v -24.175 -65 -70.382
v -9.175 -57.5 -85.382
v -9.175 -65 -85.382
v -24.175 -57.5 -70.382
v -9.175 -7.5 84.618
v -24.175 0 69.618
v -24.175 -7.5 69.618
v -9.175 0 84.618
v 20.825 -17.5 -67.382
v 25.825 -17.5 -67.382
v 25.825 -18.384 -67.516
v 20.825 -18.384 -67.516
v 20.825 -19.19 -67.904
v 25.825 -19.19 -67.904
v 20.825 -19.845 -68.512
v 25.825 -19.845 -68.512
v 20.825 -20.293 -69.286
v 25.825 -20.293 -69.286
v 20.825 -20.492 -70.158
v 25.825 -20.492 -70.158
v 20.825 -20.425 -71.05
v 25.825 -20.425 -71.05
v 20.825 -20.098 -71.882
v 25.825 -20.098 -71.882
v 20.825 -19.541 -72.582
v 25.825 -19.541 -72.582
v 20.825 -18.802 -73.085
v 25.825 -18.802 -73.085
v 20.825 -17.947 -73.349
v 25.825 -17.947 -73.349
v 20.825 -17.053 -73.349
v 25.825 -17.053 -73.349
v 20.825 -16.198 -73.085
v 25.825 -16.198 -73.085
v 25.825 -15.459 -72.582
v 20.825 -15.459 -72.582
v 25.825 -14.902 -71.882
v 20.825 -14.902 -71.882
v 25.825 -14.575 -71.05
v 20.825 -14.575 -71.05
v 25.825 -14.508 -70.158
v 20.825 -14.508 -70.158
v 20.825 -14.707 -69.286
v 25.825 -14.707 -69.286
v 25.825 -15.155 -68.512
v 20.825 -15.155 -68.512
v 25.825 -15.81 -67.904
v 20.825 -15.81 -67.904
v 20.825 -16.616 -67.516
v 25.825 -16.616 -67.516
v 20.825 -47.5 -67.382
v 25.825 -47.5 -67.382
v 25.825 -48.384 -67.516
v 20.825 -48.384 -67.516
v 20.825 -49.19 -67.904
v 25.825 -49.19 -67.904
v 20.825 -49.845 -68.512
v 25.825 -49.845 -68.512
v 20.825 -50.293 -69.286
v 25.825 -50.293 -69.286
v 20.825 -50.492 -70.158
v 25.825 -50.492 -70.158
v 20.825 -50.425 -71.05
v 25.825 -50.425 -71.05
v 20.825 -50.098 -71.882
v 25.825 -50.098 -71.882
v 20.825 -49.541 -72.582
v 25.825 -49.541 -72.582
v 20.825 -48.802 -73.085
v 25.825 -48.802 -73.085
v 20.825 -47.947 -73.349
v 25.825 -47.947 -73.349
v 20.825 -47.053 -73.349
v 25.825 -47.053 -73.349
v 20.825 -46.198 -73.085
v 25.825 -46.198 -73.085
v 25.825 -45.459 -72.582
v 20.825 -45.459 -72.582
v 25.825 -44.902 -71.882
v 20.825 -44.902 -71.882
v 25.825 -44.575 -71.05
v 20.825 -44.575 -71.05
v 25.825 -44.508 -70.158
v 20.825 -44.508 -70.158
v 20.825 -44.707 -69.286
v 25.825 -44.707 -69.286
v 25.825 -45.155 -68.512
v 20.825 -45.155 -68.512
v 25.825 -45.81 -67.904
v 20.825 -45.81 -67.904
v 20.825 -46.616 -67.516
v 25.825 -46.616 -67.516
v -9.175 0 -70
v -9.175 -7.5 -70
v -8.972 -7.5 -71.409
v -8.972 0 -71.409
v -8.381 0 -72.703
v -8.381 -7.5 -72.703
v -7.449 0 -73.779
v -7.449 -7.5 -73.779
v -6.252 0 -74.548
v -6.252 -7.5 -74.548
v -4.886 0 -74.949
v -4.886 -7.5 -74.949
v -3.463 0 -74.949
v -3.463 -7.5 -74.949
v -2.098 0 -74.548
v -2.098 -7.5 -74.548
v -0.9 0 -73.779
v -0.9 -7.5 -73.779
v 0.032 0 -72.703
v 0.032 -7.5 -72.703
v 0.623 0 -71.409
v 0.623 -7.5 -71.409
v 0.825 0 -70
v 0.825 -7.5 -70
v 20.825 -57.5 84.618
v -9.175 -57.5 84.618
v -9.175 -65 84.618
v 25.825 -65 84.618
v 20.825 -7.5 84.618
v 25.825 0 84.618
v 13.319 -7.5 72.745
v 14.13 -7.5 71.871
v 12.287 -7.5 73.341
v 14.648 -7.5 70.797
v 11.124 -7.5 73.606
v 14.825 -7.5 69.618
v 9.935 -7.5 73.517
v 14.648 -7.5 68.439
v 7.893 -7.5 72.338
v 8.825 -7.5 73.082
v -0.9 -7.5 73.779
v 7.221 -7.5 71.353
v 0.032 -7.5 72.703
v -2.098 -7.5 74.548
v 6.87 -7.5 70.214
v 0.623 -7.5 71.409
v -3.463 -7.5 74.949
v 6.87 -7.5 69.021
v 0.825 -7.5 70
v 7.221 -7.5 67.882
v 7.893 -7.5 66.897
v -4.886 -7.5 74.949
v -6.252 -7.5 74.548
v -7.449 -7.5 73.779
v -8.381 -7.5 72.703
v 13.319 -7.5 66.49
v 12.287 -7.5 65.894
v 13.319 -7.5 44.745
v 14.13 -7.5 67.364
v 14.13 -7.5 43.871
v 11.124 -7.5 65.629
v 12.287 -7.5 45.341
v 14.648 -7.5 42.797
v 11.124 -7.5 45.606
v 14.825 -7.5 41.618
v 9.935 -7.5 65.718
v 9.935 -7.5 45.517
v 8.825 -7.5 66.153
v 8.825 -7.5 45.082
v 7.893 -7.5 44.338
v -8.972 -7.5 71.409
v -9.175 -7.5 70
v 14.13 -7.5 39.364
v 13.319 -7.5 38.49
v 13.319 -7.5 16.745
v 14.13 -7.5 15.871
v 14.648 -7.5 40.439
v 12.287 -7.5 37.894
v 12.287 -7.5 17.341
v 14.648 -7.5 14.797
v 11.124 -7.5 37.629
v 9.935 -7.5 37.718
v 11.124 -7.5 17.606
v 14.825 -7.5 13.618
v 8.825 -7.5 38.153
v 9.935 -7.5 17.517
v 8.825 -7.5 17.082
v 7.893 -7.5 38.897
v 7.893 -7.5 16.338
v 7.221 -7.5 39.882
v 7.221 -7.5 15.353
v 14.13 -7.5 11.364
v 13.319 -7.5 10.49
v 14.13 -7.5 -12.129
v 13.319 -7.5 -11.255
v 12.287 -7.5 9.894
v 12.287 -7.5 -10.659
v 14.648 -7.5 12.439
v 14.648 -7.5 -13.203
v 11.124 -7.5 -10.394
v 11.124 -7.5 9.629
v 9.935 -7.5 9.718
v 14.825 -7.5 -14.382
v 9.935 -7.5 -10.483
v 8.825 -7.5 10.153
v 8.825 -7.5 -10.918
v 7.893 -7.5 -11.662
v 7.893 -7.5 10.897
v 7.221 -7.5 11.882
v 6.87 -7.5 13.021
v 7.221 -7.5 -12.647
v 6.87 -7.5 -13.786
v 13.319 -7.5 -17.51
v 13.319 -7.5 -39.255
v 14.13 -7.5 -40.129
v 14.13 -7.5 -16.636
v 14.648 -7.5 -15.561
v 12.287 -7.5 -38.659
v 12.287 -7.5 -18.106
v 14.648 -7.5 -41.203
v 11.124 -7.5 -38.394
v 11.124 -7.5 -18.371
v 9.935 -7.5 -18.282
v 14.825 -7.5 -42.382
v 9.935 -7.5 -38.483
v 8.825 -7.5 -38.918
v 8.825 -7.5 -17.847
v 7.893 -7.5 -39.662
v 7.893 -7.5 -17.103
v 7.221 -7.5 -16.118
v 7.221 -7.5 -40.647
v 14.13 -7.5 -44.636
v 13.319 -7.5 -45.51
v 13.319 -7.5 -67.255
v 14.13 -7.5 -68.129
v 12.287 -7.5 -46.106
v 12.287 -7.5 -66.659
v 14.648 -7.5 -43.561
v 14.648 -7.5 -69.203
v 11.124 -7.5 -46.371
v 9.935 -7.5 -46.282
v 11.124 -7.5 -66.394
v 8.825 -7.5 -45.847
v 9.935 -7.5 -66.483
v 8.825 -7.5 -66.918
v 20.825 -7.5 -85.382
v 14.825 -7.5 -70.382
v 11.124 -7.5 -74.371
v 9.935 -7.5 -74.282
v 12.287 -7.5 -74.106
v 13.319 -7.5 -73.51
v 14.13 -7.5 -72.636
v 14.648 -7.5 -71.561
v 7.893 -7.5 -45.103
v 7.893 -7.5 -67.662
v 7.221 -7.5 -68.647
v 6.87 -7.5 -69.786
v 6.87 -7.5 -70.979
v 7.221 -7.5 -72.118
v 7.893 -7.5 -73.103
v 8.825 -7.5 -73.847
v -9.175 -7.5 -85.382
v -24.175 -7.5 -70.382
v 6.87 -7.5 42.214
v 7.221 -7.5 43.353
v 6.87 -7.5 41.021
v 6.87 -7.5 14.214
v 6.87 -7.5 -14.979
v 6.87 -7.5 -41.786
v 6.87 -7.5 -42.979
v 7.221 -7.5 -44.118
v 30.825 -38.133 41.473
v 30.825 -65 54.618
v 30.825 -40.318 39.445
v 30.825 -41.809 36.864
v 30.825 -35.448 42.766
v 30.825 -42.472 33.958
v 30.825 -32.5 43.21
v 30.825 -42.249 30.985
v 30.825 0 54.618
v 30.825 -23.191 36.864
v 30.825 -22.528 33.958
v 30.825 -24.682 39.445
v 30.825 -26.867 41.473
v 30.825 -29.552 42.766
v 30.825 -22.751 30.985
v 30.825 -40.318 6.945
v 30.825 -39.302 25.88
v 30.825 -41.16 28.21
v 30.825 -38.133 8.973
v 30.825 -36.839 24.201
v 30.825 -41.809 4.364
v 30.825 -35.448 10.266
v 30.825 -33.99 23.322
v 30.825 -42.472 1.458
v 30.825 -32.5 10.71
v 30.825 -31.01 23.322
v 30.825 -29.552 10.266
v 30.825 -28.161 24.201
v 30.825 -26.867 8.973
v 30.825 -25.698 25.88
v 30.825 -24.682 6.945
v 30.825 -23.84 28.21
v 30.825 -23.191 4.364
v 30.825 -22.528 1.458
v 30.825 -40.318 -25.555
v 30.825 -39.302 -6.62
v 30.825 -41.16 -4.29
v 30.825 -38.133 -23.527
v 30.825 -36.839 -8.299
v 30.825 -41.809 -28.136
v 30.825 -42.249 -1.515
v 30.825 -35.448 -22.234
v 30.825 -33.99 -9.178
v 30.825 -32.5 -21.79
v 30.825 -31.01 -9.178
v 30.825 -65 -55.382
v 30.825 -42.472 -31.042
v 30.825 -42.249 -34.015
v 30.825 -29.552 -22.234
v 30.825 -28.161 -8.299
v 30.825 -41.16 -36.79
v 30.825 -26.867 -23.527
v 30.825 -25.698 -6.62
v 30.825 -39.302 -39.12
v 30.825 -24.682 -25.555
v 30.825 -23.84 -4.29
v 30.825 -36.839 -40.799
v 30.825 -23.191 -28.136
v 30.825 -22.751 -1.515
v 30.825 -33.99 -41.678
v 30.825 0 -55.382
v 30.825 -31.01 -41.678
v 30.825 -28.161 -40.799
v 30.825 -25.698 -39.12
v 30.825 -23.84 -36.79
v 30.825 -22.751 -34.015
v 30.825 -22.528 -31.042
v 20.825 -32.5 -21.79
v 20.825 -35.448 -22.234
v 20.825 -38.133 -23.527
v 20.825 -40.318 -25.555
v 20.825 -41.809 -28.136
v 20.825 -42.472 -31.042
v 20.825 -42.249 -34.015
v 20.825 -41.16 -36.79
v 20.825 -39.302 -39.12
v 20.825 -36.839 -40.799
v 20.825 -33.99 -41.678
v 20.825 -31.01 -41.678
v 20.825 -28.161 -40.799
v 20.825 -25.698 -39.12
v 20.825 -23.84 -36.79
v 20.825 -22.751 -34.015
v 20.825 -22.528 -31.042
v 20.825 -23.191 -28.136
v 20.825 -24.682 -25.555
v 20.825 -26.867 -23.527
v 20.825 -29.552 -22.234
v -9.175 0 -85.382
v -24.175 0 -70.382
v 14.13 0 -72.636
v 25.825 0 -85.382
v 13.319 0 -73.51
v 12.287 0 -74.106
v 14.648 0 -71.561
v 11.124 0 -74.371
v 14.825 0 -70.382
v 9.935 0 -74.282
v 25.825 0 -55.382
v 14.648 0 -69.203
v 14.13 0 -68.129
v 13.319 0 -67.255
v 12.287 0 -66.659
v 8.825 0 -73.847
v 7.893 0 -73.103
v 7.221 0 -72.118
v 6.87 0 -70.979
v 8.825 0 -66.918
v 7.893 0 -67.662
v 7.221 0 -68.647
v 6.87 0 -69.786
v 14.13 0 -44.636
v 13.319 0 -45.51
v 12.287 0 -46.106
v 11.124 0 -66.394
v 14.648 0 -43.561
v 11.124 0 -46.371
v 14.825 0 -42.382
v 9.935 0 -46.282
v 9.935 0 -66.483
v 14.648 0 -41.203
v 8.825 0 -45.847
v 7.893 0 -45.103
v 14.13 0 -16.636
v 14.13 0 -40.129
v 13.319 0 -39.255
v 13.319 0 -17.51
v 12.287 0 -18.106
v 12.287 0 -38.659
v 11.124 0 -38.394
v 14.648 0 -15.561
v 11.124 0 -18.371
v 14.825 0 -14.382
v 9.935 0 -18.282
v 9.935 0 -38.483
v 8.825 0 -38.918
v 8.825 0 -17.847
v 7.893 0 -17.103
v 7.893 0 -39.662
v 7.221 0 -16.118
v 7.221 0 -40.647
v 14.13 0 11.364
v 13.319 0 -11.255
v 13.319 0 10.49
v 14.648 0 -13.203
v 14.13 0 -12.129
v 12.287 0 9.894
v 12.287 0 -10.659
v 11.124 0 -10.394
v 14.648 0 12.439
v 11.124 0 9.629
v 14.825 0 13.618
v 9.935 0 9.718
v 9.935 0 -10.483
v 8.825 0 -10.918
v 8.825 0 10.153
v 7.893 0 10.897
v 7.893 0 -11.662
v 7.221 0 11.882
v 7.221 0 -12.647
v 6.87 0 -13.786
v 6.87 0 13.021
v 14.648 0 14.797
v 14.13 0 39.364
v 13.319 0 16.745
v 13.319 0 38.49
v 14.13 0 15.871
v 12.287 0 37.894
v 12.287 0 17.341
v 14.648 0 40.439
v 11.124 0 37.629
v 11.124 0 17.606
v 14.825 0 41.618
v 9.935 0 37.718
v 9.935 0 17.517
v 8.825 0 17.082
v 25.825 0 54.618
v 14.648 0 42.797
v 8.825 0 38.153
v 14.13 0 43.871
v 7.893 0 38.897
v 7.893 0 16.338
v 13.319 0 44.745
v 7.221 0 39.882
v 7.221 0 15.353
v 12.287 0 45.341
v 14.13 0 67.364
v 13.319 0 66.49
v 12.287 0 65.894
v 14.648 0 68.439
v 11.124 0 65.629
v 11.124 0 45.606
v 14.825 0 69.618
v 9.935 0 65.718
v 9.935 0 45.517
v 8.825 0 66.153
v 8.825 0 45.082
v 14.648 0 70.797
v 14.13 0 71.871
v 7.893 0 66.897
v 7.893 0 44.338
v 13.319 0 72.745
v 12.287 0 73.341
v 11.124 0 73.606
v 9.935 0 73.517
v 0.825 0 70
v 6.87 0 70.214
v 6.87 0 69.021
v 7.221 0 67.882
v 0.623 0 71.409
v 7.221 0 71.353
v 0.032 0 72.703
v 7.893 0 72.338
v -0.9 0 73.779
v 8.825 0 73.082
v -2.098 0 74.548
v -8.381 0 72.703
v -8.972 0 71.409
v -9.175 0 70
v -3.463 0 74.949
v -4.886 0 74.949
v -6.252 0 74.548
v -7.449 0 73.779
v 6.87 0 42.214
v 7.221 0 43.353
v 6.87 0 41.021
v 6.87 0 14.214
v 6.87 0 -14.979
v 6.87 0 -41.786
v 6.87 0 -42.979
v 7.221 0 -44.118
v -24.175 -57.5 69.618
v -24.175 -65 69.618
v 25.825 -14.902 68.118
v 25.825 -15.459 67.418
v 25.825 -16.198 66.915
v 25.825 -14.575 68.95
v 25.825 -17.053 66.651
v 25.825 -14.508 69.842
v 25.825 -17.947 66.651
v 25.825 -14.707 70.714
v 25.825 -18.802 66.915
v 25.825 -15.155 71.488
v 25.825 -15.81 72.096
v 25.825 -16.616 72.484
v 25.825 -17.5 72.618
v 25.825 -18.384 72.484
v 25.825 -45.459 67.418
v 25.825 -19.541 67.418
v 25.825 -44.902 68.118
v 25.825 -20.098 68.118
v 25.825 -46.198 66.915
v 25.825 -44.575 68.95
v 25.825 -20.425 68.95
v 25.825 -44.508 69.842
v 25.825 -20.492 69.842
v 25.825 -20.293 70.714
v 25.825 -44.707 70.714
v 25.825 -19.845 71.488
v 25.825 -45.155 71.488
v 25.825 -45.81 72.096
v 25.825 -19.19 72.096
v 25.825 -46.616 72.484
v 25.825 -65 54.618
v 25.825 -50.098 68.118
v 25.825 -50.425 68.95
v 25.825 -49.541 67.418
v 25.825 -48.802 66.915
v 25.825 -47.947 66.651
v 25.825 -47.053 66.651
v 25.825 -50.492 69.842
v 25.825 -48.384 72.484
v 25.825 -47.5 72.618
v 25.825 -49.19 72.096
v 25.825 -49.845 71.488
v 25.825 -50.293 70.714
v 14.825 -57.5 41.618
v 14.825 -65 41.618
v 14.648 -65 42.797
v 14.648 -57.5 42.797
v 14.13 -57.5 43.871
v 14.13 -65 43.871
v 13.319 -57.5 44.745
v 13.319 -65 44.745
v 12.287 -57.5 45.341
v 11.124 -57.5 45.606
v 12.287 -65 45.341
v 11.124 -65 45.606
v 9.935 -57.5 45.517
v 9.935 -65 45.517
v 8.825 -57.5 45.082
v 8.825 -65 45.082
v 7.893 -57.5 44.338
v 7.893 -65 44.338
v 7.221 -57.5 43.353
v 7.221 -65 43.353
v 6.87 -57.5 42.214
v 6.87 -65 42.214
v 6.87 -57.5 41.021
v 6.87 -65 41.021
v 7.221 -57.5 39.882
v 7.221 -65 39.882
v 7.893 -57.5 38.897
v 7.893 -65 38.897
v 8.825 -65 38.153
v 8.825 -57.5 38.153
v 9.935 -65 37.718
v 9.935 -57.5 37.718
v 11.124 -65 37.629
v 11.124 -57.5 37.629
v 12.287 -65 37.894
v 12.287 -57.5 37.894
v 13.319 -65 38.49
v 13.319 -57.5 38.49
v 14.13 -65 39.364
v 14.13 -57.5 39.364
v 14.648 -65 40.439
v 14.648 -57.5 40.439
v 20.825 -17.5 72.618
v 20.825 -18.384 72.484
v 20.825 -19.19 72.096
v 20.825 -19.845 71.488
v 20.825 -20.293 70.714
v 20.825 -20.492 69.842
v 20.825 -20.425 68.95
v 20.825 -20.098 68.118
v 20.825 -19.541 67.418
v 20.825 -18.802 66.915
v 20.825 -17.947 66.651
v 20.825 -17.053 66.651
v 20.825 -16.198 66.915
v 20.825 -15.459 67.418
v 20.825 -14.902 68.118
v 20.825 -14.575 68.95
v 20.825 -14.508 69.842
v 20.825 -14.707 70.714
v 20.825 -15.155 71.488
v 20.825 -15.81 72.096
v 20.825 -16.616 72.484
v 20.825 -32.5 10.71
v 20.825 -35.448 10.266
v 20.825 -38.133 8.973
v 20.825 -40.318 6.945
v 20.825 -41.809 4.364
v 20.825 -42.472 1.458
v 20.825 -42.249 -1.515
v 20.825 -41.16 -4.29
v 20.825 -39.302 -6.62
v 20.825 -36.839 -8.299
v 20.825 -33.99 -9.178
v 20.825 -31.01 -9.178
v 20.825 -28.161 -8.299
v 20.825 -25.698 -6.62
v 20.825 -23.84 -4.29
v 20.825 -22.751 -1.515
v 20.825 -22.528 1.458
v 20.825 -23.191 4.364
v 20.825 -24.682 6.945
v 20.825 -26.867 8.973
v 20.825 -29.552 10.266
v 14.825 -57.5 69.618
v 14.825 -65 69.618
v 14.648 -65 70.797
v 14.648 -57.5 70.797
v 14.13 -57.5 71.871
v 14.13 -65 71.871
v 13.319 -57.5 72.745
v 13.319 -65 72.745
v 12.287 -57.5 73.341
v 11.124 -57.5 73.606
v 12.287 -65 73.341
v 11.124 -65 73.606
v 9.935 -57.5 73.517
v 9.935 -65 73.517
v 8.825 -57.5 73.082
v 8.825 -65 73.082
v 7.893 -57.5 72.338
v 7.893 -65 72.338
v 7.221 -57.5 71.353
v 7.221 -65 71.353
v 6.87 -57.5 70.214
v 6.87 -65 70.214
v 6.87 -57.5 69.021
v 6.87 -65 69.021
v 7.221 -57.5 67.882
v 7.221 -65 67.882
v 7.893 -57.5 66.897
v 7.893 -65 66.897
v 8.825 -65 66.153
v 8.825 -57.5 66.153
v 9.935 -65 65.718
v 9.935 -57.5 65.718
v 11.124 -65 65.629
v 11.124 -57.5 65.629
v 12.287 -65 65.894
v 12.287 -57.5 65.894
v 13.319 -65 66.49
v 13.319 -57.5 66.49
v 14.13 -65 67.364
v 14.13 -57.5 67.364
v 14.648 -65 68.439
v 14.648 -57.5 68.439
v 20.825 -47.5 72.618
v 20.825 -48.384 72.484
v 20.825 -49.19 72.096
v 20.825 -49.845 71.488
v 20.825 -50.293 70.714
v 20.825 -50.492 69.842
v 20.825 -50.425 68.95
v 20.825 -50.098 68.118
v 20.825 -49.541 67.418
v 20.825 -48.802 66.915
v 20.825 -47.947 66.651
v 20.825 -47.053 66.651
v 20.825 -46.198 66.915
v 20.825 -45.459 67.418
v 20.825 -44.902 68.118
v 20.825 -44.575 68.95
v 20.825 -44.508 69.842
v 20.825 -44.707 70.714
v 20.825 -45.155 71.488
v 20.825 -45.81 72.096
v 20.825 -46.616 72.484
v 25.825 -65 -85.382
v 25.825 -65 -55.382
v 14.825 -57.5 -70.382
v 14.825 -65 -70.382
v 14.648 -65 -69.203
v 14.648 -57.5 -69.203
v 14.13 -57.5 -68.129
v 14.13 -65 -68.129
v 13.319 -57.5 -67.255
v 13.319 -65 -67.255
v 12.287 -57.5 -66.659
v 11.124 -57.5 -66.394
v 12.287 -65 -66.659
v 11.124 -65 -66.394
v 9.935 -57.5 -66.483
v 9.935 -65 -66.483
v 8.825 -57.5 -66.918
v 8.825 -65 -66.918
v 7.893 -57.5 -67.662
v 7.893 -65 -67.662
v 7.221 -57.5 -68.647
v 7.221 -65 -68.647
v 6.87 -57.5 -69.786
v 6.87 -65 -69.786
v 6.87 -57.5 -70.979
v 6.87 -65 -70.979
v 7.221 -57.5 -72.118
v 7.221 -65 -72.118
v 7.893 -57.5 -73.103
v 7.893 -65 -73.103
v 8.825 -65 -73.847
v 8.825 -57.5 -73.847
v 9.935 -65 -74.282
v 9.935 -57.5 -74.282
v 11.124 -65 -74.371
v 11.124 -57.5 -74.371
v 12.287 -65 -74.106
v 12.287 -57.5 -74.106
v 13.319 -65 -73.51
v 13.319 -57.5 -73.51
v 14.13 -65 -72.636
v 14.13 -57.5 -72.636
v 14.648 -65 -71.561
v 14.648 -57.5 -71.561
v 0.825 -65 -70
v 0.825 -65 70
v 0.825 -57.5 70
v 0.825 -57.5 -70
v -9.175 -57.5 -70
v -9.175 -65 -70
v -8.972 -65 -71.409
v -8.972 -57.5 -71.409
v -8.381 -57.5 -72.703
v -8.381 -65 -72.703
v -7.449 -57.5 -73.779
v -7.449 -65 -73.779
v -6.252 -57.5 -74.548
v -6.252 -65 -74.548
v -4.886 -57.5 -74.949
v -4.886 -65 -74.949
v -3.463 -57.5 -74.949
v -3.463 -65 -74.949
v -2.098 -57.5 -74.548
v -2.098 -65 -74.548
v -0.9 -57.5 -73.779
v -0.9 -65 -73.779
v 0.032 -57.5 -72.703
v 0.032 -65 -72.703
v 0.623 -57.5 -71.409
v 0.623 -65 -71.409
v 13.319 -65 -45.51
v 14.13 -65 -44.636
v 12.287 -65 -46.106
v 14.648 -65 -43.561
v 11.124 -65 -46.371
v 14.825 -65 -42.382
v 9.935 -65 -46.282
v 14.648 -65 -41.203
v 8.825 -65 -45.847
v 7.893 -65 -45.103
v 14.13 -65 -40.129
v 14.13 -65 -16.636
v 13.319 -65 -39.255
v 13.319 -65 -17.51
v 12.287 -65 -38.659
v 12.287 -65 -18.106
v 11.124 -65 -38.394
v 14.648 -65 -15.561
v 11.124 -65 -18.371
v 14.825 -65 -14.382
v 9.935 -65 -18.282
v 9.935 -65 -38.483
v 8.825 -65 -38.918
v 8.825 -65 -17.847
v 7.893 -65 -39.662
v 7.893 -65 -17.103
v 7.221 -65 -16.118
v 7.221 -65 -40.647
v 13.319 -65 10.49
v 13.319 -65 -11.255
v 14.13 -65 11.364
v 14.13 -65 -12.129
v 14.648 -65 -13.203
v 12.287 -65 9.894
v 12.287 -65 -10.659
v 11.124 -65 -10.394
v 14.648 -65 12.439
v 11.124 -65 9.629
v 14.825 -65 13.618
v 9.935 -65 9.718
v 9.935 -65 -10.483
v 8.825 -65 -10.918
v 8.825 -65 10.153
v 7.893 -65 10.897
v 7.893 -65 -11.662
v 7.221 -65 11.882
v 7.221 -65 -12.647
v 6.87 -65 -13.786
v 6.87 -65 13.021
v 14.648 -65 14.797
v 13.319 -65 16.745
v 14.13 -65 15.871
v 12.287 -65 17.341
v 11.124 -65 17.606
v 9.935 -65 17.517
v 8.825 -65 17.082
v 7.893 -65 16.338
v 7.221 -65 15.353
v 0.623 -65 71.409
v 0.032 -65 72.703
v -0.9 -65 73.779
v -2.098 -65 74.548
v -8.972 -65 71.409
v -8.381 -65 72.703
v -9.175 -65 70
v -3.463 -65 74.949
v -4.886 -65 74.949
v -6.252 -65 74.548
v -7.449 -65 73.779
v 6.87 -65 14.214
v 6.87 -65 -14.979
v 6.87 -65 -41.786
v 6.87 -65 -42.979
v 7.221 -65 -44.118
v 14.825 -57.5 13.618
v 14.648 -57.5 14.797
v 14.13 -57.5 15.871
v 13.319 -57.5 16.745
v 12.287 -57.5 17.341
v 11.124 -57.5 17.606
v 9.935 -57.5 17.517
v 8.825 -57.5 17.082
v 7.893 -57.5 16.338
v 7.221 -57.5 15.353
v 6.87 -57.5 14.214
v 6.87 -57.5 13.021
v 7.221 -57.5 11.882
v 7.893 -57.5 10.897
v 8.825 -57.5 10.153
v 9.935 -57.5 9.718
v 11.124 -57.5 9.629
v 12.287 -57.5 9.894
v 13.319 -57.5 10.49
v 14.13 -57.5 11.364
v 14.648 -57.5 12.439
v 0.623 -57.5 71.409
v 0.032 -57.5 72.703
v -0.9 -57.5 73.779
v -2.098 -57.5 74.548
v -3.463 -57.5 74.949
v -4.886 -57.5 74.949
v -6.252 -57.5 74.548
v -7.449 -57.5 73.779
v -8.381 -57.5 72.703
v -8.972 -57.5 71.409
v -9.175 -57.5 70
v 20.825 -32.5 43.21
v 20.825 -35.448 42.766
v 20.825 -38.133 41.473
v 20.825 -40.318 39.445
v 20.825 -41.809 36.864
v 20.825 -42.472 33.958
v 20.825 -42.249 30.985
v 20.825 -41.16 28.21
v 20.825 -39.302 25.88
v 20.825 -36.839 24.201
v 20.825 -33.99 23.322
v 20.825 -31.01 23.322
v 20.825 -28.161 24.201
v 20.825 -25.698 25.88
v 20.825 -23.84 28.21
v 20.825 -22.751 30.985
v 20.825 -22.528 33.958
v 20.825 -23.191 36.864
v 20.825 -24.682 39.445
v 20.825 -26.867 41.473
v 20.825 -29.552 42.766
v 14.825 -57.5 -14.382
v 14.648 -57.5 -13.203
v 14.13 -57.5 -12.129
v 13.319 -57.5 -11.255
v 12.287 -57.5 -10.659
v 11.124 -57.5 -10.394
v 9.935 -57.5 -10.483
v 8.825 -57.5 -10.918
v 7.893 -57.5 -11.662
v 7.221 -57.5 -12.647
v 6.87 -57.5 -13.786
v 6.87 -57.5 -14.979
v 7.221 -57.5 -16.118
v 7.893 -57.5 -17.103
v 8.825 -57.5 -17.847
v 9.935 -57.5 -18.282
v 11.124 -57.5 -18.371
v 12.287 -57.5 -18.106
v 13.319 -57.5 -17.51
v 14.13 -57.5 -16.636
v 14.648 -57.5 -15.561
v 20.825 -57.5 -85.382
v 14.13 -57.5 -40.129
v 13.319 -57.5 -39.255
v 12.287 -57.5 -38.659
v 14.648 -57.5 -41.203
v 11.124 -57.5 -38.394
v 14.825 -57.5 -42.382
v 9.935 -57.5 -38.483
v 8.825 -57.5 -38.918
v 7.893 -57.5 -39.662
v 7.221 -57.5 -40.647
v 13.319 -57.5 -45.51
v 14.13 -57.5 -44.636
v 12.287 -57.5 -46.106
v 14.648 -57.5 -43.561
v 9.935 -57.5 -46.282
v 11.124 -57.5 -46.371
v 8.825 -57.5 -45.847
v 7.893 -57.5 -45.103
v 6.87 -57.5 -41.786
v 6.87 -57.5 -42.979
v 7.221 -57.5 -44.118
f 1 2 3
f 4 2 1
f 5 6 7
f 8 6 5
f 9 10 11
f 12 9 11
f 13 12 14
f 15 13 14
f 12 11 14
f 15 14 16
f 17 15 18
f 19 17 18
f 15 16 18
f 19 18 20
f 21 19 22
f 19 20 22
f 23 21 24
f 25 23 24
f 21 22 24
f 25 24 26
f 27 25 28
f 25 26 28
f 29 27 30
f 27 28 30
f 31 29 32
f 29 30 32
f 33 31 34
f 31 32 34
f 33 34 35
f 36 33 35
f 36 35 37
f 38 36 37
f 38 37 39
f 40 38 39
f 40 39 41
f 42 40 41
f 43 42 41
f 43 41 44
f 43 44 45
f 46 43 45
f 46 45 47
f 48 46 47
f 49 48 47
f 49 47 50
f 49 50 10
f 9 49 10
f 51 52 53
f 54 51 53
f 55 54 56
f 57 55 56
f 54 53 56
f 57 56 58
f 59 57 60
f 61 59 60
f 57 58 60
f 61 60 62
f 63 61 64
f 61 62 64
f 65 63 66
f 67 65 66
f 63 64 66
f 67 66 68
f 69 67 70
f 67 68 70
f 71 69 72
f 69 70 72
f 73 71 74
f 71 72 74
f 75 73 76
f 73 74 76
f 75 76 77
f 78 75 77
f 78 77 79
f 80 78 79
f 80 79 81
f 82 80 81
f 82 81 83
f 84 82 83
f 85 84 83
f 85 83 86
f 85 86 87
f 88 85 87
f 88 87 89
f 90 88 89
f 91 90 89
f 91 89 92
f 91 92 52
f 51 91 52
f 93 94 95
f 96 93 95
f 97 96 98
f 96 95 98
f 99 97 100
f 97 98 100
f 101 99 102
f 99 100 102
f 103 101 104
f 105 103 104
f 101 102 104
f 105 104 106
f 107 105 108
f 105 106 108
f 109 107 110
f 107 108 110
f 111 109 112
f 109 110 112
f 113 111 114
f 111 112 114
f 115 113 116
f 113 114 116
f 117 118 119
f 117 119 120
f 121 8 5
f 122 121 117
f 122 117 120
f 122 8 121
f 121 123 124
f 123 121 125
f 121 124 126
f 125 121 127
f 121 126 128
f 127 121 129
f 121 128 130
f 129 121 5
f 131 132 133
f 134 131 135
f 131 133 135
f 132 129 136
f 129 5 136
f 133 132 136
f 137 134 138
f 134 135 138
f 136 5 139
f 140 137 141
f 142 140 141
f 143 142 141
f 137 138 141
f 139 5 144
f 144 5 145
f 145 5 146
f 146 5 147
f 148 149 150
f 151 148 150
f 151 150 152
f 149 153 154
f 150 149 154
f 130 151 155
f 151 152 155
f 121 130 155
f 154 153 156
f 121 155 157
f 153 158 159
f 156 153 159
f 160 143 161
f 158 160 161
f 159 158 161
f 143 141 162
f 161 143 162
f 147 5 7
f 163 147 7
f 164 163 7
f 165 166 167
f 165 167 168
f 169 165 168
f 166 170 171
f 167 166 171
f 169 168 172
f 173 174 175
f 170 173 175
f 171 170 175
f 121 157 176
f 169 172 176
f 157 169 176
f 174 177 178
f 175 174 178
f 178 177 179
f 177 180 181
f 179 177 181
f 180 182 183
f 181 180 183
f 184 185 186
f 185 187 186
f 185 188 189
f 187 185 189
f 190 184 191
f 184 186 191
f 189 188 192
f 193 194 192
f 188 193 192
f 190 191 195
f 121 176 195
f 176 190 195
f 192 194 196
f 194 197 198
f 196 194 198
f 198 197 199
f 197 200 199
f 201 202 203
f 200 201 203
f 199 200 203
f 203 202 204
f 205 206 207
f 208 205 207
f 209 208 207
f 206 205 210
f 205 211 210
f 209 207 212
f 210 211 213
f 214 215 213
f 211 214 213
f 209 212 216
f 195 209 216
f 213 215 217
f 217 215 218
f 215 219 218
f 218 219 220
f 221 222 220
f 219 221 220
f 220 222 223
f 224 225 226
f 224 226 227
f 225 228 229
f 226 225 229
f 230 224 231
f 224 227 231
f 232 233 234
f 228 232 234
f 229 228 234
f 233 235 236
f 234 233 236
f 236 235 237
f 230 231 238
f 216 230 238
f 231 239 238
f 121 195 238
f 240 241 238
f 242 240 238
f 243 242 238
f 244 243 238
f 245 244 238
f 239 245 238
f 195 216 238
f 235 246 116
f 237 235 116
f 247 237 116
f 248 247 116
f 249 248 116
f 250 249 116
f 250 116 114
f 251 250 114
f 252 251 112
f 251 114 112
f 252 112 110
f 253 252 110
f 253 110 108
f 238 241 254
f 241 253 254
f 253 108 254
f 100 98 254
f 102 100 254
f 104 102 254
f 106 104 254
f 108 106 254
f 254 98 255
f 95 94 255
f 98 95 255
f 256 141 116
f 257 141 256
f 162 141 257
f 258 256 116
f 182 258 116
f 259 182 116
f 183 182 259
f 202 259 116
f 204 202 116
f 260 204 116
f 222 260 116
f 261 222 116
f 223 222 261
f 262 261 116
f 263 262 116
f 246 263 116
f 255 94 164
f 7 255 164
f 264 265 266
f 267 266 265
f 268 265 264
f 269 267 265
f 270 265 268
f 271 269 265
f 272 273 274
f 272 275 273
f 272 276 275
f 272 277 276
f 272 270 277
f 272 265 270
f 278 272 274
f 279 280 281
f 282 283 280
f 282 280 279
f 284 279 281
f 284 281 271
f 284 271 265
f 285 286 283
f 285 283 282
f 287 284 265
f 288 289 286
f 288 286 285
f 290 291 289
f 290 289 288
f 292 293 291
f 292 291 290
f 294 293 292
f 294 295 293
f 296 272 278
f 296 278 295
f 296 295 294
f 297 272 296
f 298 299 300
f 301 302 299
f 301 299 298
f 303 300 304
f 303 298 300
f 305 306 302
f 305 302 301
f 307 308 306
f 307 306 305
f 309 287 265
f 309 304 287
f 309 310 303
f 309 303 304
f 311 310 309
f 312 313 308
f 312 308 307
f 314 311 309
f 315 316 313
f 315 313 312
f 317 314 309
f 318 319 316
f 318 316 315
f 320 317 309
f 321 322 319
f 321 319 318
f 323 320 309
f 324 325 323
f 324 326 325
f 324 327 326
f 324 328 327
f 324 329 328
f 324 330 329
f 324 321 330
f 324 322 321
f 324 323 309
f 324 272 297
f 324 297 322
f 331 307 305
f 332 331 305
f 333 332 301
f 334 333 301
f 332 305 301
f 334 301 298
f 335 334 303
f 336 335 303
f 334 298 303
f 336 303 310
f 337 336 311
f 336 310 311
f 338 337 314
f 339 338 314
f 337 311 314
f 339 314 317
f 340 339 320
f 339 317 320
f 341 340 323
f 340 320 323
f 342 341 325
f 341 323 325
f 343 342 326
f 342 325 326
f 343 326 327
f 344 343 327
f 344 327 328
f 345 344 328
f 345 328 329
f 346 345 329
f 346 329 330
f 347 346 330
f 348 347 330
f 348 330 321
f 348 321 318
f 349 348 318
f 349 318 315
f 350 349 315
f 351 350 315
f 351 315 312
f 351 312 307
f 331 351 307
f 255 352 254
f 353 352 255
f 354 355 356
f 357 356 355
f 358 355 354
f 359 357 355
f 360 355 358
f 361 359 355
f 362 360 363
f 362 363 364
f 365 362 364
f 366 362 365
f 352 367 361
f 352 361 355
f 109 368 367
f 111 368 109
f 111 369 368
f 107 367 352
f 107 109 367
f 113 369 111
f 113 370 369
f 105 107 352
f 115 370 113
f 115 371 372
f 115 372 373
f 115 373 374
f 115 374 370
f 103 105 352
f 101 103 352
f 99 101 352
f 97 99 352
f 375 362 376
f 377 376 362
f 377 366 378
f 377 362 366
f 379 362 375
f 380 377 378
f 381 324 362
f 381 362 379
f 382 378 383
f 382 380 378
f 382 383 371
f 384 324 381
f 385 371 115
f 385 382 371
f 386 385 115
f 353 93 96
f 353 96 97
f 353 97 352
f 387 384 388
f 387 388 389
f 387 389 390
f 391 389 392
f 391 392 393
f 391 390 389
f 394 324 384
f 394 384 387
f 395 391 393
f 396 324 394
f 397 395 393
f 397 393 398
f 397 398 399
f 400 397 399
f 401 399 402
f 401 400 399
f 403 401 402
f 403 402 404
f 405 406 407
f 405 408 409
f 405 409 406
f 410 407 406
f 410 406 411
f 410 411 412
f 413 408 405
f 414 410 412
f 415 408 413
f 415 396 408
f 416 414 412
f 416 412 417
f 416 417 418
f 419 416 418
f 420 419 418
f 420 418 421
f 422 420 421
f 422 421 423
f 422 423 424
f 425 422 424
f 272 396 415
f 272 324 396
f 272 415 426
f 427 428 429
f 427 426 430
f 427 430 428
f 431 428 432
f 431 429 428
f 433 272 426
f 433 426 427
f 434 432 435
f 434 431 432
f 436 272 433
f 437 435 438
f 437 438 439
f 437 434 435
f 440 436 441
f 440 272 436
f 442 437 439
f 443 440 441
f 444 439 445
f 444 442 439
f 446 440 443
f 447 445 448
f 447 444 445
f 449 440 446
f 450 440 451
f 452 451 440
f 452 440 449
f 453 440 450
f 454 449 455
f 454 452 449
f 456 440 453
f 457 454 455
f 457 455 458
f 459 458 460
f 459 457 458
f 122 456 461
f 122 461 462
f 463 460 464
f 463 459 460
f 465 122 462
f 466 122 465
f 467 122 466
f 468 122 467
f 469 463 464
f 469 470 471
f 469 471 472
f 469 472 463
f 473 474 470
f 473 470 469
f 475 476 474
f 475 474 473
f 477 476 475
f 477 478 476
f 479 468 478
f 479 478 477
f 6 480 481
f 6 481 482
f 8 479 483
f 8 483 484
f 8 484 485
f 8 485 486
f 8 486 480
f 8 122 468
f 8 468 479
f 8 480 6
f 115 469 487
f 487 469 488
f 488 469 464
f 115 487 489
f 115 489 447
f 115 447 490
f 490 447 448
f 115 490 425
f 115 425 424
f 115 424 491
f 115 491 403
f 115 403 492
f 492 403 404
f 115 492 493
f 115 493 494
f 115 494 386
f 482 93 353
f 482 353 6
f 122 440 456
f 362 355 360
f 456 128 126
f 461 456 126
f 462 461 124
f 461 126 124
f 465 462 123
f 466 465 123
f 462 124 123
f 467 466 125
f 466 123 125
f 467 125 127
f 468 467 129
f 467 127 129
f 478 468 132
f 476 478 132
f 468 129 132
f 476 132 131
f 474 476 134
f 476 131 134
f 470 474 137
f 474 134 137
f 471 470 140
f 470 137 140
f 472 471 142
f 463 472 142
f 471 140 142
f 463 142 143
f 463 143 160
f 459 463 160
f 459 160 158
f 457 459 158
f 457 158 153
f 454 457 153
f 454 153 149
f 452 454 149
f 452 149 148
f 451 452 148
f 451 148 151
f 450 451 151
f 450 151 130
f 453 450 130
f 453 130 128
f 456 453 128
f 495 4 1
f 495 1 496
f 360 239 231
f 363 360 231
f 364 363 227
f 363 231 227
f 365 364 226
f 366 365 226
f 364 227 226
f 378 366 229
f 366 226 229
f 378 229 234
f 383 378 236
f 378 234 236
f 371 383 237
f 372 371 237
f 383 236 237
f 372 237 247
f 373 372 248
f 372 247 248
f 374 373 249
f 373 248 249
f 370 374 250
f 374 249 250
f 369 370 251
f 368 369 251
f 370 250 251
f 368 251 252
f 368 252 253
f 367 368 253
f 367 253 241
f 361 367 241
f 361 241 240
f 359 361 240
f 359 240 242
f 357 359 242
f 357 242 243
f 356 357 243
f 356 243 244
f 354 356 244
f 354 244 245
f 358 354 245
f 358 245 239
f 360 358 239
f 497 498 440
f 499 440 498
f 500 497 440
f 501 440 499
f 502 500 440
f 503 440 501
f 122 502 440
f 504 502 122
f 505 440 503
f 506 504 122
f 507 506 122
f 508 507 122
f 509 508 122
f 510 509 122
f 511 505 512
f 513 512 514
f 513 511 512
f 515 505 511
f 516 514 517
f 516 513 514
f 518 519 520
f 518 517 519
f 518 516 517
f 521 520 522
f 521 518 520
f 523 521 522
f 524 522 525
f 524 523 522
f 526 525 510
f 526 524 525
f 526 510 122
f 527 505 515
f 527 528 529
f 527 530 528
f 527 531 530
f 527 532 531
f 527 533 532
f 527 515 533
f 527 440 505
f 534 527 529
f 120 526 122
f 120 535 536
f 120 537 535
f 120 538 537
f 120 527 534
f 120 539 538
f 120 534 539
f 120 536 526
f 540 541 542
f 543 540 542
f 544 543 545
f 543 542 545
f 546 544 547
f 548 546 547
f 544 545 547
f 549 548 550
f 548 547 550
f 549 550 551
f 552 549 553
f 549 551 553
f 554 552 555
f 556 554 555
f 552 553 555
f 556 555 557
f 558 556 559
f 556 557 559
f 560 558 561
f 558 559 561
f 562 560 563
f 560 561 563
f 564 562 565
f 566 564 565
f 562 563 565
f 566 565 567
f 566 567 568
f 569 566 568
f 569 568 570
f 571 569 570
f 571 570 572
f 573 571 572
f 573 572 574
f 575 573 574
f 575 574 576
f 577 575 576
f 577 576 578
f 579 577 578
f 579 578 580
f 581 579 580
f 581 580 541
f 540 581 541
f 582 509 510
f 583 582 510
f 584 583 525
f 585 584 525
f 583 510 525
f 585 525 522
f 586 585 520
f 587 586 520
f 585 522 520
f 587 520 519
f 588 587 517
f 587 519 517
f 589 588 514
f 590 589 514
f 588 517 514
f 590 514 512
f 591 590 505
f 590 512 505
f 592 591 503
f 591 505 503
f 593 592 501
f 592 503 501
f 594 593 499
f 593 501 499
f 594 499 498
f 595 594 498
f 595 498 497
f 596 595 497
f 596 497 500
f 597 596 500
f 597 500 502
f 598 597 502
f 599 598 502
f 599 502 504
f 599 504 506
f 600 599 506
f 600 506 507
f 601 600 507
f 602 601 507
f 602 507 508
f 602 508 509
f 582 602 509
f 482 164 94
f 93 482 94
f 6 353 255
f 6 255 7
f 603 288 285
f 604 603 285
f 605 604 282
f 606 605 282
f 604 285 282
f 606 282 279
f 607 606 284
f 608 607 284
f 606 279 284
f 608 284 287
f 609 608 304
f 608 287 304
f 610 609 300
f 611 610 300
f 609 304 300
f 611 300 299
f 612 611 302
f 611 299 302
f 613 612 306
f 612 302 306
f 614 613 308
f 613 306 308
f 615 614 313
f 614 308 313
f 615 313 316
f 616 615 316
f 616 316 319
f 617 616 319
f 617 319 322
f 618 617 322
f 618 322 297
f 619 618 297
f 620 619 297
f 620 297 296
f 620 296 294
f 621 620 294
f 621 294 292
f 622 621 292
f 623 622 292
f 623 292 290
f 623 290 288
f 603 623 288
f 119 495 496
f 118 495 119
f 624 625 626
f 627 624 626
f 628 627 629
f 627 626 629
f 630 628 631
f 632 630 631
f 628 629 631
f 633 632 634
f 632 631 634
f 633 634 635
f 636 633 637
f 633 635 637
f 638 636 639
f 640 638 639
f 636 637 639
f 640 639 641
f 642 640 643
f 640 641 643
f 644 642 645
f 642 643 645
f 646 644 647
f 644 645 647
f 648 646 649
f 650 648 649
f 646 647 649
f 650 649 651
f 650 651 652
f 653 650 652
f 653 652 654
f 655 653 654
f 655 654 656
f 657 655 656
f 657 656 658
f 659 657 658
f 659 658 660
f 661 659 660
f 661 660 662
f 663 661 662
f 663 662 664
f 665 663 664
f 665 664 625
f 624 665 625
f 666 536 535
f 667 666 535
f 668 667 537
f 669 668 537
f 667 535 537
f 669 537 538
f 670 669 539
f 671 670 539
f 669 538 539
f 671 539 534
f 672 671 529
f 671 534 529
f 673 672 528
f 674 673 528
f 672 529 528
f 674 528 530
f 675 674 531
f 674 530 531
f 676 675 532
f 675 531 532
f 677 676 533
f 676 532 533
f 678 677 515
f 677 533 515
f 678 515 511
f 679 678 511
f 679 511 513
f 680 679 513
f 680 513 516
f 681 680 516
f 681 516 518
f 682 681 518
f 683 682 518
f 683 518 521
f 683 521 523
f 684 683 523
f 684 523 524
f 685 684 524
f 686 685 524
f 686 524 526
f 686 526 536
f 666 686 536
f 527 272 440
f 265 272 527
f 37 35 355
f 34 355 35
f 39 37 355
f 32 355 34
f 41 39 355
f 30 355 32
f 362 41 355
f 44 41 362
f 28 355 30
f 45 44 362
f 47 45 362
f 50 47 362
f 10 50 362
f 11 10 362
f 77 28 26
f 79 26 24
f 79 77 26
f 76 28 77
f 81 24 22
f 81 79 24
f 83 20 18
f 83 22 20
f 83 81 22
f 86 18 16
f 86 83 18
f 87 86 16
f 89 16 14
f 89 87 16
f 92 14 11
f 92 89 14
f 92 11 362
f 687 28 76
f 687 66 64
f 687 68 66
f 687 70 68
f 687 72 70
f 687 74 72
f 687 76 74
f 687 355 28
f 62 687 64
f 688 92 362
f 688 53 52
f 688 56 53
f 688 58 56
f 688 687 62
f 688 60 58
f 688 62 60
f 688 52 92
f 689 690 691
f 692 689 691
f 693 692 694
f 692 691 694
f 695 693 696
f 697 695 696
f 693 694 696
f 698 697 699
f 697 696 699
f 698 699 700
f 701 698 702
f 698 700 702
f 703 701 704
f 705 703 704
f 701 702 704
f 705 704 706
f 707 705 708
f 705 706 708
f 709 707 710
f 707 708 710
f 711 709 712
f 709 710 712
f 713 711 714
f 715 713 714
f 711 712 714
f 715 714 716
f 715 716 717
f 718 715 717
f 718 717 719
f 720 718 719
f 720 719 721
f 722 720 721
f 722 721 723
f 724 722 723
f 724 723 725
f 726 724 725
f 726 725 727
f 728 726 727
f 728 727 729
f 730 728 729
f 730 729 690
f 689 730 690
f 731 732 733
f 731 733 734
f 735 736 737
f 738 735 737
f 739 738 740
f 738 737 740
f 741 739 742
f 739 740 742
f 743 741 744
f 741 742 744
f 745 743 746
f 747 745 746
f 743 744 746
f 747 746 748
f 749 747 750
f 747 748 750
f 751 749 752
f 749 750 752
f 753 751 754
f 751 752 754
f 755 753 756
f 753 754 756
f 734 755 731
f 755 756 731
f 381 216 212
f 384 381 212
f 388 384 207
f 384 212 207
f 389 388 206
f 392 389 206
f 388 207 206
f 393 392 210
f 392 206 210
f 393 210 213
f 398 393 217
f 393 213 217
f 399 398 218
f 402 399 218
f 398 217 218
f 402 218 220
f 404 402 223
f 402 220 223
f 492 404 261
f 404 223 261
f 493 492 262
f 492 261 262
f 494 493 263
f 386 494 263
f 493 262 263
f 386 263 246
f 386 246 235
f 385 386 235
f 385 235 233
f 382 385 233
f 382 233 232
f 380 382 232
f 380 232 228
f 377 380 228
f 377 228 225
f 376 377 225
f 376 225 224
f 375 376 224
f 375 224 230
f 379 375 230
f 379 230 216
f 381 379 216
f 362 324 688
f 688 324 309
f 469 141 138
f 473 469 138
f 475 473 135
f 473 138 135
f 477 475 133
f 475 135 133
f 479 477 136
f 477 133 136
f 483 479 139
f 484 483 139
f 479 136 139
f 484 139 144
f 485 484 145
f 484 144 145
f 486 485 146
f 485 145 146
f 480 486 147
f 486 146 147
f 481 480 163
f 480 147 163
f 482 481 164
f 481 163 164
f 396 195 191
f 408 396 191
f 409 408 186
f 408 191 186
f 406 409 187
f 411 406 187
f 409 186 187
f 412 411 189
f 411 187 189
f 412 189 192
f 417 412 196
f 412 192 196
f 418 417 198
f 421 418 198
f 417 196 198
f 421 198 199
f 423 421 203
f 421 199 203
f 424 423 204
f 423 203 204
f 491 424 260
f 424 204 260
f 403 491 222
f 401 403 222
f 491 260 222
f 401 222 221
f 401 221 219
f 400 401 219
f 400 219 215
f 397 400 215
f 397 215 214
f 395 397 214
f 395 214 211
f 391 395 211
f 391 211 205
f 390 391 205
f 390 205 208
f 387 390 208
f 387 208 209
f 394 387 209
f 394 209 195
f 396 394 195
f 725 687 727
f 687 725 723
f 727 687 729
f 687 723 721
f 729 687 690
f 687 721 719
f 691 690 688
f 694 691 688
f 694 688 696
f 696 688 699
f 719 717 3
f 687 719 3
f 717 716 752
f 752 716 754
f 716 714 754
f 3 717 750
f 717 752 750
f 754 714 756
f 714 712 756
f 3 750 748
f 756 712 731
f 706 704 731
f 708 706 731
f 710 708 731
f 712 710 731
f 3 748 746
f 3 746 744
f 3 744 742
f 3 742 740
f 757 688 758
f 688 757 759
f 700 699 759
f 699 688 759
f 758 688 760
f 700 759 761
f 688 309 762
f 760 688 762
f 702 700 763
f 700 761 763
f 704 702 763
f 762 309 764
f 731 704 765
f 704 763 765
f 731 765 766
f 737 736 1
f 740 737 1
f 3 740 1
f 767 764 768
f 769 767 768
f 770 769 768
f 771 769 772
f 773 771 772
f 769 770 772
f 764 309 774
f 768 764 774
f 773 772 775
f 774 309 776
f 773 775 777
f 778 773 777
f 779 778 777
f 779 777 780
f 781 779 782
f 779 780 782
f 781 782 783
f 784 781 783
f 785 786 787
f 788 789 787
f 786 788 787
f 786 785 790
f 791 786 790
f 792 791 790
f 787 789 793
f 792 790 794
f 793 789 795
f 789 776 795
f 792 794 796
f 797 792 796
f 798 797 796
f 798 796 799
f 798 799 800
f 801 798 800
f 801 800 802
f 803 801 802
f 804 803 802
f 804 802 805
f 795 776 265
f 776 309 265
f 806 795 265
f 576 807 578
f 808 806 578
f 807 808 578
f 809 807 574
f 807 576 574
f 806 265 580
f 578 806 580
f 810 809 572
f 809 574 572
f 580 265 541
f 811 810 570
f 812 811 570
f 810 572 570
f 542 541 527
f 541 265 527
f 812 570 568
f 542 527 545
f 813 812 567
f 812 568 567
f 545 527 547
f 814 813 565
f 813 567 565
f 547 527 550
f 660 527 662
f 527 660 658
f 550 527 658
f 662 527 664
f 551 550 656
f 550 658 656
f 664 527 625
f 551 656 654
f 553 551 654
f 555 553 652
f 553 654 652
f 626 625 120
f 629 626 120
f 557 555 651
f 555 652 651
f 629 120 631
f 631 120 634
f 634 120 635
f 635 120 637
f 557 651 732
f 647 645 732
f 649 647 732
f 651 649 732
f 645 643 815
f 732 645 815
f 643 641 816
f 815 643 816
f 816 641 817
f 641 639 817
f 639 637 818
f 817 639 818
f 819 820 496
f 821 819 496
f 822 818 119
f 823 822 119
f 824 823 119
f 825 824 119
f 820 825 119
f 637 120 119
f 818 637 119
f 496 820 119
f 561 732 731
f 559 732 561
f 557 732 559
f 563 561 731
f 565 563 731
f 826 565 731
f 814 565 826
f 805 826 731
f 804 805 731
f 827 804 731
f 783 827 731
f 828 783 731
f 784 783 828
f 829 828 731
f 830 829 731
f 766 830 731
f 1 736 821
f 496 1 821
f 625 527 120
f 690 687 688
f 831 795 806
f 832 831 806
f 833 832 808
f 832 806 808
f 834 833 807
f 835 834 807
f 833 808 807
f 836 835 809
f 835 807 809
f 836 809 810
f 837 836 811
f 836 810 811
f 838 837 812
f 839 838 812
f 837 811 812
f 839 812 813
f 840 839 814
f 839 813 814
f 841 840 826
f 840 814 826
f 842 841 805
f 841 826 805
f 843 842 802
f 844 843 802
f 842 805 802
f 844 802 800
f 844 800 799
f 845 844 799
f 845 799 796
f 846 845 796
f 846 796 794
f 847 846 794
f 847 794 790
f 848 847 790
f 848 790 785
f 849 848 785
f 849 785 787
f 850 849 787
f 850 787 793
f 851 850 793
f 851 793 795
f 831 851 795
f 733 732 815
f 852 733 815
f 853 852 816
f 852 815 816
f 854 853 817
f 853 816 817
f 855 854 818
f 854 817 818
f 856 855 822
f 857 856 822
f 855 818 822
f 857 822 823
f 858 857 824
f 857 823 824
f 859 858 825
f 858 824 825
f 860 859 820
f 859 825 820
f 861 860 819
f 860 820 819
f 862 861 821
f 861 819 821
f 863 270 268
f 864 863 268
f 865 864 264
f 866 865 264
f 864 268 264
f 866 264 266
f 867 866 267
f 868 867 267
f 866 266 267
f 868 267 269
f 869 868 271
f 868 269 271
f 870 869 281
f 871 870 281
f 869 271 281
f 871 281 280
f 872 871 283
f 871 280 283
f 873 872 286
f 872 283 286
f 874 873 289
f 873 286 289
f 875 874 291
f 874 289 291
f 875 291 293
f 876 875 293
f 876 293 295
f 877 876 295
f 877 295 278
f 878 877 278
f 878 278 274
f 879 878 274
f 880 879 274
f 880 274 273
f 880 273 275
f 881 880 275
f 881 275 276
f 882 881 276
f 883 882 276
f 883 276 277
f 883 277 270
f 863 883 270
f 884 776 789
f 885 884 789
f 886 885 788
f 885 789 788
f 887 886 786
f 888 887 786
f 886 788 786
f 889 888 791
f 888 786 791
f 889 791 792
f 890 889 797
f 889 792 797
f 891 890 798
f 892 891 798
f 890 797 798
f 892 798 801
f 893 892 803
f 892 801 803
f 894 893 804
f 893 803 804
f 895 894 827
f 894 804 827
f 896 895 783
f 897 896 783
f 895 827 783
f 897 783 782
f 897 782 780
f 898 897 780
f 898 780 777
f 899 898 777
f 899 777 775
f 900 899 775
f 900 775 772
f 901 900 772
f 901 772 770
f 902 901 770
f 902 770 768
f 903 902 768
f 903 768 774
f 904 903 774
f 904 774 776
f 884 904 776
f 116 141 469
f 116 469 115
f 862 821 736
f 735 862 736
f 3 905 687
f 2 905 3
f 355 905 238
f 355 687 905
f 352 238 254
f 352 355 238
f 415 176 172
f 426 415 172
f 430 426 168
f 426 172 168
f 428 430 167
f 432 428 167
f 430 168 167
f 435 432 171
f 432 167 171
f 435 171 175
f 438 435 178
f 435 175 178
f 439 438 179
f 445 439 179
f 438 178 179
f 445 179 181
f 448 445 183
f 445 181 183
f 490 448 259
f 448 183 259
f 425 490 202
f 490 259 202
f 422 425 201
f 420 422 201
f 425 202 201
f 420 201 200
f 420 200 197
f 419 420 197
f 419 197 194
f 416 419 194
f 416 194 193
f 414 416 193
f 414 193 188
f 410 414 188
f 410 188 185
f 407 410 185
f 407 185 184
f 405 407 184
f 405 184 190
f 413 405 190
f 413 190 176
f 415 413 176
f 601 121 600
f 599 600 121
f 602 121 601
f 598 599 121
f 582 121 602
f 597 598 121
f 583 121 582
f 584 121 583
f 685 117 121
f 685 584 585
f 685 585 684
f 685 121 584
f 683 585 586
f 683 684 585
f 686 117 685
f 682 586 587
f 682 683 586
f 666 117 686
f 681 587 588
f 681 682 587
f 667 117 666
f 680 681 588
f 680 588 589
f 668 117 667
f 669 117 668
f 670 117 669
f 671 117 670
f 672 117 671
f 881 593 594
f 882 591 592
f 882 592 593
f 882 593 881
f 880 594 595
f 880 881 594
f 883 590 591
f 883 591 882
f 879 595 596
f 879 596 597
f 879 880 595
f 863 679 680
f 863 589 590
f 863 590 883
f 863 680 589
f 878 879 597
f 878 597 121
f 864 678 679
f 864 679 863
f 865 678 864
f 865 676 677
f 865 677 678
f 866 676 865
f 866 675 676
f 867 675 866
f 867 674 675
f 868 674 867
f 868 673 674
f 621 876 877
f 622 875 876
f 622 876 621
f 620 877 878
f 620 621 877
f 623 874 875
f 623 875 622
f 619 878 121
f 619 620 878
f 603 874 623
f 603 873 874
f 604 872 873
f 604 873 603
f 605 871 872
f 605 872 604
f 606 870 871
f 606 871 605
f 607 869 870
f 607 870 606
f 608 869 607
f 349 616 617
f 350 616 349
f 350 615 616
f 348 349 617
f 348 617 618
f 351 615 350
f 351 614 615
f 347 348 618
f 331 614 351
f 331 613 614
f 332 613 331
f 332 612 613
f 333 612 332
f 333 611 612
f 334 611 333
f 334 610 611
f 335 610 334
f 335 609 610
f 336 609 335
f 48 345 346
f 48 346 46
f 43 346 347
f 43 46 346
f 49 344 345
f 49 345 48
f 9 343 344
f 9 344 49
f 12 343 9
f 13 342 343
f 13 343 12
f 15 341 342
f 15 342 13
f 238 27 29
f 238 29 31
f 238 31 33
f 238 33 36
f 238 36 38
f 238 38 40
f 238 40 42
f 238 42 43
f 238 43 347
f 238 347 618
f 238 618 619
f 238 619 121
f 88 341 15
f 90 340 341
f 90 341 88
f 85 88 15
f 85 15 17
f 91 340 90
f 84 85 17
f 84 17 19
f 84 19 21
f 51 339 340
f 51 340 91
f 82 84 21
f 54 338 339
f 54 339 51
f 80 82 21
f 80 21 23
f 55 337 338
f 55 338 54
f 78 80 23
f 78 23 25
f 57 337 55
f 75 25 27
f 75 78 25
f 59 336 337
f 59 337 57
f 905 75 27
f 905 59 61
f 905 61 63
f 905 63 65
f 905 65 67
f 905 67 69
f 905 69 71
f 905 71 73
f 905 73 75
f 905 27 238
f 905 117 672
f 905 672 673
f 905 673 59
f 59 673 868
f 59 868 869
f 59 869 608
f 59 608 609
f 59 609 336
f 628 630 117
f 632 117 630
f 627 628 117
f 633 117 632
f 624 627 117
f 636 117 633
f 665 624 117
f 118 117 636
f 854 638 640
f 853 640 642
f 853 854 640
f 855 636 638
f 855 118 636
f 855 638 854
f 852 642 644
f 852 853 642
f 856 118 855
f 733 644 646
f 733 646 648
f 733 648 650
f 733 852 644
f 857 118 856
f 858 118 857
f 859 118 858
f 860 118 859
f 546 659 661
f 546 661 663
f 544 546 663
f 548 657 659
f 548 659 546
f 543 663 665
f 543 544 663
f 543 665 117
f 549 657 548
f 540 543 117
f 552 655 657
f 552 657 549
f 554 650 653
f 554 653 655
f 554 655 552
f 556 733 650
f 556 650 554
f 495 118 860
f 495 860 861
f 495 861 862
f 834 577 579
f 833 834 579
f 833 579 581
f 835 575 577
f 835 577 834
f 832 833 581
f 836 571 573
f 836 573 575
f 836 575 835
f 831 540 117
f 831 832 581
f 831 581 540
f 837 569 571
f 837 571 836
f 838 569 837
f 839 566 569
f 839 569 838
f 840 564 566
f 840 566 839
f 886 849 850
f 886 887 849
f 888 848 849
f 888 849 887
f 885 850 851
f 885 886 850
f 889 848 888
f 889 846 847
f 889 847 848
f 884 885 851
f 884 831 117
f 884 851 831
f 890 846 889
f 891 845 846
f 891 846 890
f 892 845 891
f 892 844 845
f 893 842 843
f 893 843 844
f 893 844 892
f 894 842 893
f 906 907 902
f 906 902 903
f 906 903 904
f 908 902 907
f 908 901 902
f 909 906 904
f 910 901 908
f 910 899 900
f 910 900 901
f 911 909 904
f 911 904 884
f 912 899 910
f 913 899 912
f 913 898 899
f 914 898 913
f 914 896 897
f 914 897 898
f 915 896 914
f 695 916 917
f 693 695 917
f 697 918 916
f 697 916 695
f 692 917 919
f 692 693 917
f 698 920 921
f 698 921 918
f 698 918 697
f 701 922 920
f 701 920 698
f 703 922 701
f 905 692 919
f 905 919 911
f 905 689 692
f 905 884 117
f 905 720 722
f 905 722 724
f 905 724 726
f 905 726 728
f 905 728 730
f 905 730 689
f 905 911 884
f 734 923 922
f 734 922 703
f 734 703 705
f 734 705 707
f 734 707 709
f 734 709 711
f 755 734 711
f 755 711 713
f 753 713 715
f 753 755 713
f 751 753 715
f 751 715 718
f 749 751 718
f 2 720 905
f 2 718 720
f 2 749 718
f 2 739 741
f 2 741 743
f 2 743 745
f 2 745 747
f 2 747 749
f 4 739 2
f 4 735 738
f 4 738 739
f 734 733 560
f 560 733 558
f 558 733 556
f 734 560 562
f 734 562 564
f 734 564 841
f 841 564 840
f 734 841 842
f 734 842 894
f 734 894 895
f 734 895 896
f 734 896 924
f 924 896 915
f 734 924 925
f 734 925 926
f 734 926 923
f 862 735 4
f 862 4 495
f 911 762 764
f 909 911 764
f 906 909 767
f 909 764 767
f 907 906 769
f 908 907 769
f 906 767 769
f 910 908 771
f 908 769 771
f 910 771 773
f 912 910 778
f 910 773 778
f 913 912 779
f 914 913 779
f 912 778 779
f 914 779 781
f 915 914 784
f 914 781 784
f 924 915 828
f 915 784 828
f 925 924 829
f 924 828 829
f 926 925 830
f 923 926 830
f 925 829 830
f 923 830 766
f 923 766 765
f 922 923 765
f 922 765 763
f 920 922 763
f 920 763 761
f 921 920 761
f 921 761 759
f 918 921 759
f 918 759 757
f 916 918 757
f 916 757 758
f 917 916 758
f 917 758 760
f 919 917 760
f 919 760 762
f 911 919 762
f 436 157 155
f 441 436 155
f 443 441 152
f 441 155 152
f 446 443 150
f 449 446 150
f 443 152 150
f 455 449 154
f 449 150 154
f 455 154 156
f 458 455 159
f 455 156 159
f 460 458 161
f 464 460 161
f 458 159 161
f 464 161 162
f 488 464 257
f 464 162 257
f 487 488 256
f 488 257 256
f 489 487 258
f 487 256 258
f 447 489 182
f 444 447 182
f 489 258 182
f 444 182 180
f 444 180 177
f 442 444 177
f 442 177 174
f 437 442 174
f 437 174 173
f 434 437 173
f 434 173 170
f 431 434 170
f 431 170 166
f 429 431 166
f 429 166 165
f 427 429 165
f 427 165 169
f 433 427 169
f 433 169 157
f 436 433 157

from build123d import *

# Parameters (mm, degrees)
PAD_DEPTH              = 65
POCKET_DEPTH           = 65.001
SKETCH002_R            = 4
POCKET001_DEPTH        = 65.001
LINEARPATTERN_COUNT    = 6
LINEARPATTERN_PITCH    = 28
SKETCH003_W            = 170
SKETCH003_H            = 50
POCKET002_DEPTH        = 45
SKETCH004_W            = 30
SKETCH004_H            = 65
POCKET003_DEPTH        = 5
SKETCH005_R            = 3
POCKET004_DEPTH        = 50.001
SKETCH035_R            = 10
POCKET023_DEPTH        = 55.001
LINEARPATTERN001_COUNT = 3
LINEARPATTERN001_PITCH = 32.5


with BuildPart() as part:
    # Sketch → Pad (new body)
    with BuildSketch(Plane.XZ):
        Polygon((-9.174668, 84.617545), (30.825332, 84.617545), (30.825332, -85.382455), (-9.174668, -85.382455), (-24.174668, -70.382455), (-24.174668, 69.617545), align=None)
    extrude(amount=PAD_DEPTH)

    # Sketch001 (on Face8 of Pad) → Pocket (cut, through all)
    with BuildSketch(Plane.XZ.offset(65)):
        with BuildLine():
            ThreePointArc((0.825332, 70), (-4.174668, 75), (-9.174668, 70))
            Line((-9.174668, 70), (-9.174668, -70))
            ThreePointArc((-9.174668, -70), (-4.174668, -75), (0.825332, -70))
            Line((0.825332, 70), (0.825332, -70))
        make_face()
    extrude(amount=-POCKET_DEPTH, mode=Mode.SUBTRACT)

    # Sketch002 (on Face5 of Pocket) → Pocket001 (cut, through all)
    with BuildSketch(Plane.XZ.offset(65)):
        with Locations((10.825332, 69.617545)):
            Circle(SKETCH002_R)
    pocket001 = extrude(amount=-POCKET001_DEPTH, mode=Mode.SUBTRACT)

    # LinearPattern: Pocket001 ×6
    with Locations(*[(0, 0, -i * LINEARPATTERN_PITCH) for i in range(1, LINEARPATTERN_COUNT)]):
        add(pocket001, mode=Mode.SUBTRACT)

    # Sketch003 (on Face1 of LinearPattern) → Pocket002 (cut)
    with BuildSketch(Plane(origin=(-24.174668, 0, 0), x_dir=(0, 0, -1), z_dir=(-1, 0, 0))):
        with Locations((0.382455, 32.5)):
            Rectangle(SKETCH003_W, SKETCH003_H)
    extrude(amount=-POCKET002_DEPTH, mode=Mode.SUBTRACT)

    # Sketch004 (on Face8 of Pocket002) → Pocket003 (cut)
    with BuildSketch(Plane(origin=(30.825332, 0, 0), x_dir=(0, 0, 1), z_dir=(1, 0, 0))):
        with Locations((-70.382455, 32.5)):
            Rectangle(SKETCH004_W, SKETCH004_H)
        with Locations((69.617545, 32.5)):
            Rectangle(SKETCH004_W, SKETCH004_H)
    extrude(amount=-POCKET003_DEPTH, mode=Mode.SUBTRACT)

    # Sketch005 → Pocket004 (cut, through all)
    with BuildSketch(Plane(origin=(25.825332, 0, 0), x_dir=(0, 0, 1), z_dir=(1, 0, 0))):
        with Locations((-70.382455, 17.5)):
            Circle(SKETCH005_R)
        with Locations((-70.382455, 47.5)):
            Circle(SKETCH005_R)
        with Locations((69.617545, 47.5)):
            Circle(SKETCH005_R)
        with Locations((69.617545, 17.5)):
            Circle(SKETCH005_R)
    extrude(amount=-POCKET004_DEPTH, mode=Mode.SUBTRACT)

    # Sketch035 → Pocket023 (cut, through all)
    with BuildSketch(Plane(origin=(30.825332, 0, 0), x_dir=(0, 0, 1), z_dir=(1, 0, 0))):
        with Locations((-31.789585, 32.5)):
            Circle(SKETCH035_R)
    pocket023 = extrude(amount=-POCKET023_DEPTH, mode=Mode.SUBTRACT)

    # LinearPattern001: Pocket023 ×3
    with Locations(*[(0, 0, i * LINEARPATTERN001_PITCH) for i in range(1, LINEARPATTERN001_COUNT)]):
        add(pocket023, mode=Mode.SUBTRACT)


solid = part.part
